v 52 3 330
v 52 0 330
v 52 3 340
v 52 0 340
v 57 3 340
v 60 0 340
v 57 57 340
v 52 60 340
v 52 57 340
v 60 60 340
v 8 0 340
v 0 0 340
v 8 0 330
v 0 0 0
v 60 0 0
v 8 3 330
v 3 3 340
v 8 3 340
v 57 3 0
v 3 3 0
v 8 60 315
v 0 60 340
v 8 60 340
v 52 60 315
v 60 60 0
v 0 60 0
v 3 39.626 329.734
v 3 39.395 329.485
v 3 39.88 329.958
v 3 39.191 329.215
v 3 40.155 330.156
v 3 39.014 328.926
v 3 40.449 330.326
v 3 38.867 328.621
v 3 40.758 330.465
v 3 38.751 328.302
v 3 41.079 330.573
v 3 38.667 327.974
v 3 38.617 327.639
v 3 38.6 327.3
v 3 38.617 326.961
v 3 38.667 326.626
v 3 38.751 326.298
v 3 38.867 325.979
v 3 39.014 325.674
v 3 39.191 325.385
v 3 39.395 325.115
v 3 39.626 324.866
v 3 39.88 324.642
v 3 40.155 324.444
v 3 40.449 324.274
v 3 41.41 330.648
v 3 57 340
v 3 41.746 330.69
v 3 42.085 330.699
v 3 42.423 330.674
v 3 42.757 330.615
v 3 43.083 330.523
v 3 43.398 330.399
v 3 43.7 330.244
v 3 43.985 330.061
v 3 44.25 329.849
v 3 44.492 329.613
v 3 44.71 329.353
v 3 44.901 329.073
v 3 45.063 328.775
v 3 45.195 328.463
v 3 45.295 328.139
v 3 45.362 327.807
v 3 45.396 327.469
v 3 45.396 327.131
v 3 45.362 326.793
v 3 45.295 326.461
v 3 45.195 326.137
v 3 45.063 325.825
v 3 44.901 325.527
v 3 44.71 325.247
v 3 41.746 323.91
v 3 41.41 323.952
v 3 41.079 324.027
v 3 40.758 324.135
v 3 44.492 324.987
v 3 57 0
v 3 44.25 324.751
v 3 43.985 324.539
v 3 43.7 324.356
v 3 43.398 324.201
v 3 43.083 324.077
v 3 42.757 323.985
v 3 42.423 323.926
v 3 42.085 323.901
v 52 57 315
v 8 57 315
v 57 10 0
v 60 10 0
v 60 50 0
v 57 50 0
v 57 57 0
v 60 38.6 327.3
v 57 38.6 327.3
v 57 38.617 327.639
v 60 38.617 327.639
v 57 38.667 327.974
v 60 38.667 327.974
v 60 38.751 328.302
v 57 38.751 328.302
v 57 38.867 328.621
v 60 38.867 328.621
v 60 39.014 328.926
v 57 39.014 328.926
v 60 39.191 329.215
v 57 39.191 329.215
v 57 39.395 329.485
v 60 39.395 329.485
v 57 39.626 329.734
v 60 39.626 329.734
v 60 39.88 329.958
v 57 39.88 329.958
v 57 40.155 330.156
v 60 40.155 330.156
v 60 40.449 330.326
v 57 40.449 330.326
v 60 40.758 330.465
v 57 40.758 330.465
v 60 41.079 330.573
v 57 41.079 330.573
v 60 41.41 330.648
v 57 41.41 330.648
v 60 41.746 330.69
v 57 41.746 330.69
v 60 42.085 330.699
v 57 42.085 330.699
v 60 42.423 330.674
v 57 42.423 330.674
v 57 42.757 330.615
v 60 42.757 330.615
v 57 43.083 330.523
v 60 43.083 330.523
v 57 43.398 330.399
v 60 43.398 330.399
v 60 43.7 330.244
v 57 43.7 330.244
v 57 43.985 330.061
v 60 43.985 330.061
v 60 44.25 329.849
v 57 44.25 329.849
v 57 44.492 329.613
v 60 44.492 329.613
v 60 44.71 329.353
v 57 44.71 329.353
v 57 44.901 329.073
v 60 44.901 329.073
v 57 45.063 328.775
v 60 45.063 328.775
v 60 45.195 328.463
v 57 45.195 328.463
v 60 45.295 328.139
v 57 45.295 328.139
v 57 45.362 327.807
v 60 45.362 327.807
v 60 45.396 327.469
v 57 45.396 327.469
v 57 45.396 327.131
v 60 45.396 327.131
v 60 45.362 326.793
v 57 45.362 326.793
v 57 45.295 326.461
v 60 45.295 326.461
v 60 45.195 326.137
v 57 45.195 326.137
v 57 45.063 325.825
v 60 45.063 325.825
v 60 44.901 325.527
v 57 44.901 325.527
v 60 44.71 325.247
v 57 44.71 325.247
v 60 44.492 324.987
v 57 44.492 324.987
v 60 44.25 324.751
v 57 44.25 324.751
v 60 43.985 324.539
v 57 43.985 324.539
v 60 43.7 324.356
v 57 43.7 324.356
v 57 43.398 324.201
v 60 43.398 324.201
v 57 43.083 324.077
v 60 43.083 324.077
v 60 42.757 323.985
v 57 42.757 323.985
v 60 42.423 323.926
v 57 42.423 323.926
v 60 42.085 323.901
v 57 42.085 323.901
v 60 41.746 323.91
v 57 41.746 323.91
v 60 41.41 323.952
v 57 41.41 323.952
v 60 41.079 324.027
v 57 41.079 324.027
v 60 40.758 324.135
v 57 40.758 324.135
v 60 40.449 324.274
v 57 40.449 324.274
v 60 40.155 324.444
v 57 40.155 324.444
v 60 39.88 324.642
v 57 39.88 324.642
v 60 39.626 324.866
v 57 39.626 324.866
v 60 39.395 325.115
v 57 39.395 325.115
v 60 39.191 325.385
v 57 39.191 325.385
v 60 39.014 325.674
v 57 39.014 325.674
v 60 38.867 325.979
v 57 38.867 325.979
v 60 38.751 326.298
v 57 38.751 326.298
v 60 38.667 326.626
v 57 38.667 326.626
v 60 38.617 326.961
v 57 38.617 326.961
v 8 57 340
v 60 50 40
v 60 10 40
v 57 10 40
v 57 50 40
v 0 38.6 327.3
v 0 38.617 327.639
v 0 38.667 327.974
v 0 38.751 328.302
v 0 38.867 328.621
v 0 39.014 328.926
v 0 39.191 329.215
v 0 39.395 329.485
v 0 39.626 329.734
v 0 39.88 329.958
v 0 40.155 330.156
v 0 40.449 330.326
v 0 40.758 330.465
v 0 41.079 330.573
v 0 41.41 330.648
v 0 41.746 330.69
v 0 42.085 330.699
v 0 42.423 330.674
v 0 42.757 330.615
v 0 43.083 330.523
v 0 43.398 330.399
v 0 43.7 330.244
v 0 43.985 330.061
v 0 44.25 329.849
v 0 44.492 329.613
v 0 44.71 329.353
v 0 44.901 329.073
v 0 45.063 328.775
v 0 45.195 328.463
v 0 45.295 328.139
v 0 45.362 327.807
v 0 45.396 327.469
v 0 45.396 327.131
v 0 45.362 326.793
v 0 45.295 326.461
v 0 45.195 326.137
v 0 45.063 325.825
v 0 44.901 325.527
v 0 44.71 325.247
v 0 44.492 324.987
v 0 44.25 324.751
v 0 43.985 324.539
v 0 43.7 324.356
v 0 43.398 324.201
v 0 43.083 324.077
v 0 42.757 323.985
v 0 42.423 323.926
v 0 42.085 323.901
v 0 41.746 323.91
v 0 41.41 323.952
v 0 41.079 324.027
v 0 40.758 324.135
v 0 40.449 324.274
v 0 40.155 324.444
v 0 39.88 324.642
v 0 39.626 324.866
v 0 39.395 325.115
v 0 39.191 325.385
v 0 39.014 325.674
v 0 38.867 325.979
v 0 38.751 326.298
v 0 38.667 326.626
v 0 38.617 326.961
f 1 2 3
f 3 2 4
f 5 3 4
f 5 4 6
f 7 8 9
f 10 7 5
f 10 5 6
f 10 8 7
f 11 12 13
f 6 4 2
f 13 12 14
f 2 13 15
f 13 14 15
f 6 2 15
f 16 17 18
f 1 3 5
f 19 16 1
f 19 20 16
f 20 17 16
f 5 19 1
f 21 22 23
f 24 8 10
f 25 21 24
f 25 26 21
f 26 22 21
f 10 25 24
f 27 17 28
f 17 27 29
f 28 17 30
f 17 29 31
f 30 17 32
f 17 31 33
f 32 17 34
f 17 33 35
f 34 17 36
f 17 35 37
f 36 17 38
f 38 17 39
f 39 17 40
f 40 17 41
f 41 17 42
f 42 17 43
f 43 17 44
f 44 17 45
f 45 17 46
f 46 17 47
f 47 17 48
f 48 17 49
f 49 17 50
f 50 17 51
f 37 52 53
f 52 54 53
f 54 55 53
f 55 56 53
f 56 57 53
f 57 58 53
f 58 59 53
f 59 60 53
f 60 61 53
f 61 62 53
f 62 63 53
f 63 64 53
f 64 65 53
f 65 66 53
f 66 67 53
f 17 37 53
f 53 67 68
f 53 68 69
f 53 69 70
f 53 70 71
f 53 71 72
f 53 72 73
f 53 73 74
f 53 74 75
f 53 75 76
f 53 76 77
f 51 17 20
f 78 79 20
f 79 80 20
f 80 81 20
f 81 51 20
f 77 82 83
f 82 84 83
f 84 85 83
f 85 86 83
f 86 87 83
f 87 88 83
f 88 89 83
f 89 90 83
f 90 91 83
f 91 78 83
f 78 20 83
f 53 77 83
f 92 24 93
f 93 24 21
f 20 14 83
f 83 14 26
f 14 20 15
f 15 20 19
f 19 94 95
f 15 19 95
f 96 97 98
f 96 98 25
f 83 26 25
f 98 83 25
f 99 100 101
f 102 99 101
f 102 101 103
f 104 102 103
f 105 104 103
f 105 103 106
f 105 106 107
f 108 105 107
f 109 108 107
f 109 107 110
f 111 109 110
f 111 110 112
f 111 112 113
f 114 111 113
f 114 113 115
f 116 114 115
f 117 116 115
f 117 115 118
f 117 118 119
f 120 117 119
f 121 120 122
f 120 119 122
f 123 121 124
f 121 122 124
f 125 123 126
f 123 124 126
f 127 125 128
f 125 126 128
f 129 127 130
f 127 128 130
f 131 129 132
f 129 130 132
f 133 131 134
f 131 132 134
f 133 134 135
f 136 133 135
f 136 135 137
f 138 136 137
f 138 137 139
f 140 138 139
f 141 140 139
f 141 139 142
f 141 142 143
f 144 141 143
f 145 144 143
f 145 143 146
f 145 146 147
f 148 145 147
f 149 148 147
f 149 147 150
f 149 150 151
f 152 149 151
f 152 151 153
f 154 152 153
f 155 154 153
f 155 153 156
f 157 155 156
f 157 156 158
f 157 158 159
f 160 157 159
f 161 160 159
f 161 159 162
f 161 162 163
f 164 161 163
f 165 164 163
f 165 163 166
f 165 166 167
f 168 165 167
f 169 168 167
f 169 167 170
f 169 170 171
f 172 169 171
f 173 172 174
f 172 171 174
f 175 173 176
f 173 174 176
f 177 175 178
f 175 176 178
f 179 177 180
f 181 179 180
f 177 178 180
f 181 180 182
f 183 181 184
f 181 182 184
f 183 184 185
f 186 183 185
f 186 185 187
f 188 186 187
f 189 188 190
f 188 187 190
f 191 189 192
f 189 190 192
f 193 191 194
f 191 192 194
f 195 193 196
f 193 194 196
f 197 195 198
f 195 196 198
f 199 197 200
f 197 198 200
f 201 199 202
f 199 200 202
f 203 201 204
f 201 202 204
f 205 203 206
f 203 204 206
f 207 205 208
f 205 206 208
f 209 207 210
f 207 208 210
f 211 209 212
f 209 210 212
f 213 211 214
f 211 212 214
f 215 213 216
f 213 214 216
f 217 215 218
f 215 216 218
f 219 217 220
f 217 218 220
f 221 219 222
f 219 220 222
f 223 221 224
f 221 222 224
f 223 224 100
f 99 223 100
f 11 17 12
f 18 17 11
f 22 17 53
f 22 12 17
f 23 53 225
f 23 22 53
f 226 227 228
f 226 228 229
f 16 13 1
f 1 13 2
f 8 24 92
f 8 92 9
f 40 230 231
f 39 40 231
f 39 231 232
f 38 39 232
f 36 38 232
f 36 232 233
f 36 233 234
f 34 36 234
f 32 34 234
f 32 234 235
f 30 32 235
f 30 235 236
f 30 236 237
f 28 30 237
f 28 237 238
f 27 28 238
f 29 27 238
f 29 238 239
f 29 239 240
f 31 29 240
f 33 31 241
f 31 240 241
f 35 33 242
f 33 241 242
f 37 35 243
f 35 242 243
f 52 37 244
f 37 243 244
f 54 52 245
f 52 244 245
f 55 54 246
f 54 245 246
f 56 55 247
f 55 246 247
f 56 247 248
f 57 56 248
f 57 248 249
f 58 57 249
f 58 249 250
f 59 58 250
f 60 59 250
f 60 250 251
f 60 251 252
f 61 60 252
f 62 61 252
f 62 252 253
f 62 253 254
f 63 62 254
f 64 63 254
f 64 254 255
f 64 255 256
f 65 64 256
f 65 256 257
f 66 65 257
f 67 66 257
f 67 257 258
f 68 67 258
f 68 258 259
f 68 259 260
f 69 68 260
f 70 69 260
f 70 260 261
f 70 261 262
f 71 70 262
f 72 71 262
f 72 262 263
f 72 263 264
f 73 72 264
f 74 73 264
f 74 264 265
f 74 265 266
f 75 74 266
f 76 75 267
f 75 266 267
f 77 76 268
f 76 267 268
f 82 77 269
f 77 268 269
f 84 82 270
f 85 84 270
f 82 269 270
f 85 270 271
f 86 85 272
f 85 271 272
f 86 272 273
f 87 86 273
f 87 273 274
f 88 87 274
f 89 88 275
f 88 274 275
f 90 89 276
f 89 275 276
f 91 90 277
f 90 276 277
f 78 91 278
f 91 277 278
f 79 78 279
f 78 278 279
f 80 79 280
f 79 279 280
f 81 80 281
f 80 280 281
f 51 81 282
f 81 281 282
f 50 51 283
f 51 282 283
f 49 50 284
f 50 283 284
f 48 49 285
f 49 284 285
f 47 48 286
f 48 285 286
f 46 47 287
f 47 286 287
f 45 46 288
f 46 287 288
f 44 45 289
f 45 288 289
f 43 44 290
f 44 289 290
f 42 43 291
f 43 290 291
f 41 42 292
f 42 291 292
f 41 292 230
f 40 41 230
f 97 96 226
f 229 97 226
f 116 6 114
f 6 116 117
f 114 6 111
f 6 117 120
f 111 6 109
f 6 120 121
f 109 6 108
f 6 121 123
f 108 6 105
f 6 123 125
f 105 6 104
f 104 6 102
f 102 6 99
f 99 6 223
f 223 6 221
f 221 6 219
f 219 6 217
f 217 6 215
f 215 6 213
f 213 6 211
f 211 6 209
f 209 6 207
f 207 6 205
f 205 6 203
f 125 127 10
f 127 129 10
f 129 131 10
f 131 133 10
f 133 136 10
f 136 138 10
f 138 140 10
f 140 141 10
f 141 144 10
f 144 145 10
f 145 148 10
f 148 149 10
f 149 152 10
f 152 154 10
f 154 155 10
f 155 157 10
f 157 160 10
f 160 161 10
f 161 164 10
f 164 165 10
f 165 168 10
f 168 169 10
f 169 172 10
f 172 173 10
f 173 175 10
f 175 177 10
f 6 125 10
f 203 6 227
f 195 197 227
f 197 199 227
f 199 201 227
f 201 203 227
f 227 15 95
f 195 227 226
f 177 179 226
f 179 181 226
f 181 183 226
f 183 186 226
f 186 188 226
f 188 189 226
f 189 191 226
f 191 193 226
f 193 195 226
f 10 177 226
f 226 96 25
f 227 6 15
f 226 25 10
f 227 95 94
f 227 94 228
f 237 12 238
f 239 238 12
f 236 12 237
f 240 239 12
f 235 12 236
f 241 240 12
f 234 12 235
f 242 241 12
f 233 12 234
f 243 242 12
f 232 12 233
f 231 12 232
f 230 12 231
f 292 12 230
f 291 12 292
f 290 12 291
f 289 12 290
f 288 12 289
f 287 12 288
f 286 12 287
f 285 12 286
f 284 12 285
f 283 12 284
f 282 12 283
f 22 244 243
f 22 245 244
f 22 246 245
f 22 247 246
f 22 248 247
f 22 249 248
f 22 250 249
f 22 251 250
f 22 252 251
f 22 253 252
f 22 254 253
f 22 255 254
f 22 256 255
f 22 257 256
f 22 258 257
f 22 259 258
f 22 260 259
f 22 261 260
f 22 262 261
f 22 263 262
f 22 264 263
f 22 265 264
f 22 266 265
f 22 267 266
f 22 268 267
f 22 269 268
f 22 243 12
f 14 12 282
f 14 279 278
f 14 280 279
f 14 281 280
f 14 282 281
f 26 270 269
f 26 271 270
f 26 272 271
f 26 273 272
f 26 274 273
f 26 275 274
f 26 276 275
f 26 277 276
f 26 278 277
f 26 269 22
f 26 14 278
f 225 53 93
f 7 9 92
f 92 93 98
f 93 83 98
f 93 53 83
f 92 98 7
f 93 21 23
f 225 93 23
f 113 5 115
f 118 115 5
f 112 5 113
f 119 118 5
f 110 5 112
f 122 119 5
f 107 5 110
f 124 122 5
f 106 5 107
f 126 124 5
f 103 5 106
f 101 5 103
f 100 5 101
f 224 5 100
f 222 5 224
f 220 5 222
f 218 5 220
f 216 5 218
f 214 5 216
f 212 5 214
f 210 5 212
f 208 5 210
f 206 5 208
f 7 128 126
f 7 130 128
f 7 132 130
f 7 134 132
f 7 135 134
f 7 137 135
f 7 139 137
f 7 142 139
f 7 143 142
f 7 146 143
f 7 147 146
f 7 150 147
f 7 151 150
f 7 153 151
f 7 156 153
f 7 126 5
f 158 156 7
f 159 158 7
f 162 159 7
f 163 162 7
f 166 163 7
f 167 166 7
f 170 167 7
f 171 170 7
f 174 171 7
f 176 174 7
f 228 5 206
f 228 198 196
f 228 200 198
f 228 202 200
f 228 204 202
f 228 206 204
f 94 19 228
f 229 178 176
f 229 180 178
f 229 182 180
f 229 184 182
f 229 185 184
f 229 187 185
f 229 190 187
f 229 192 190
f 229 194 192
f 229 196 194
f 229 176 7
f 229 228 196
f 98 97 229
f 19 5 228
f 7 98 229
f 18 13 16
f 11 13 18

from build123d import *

# Parameters (mm, degrees)
F0_W     = 60
F0_H     = 60
F0_W_2   = 54
F0_H_2   = 54
F1_DEPTH = 340
F2_W     = 40
F2_H     = 40
F3_DEPTH = 3
F4_W     = 44
F4_H     = 25
F5_DEPTH = 3
F7_D     = 6.8
F8_W     = 44
F8_H     = 10
F9_DEPTH = 25


with BuildPart() as f1:
    # F0 (on Top) → F1 (new body)
    with BuildSketch(Plane.XY):
        with Locations((30, 30)):
            Rectangle(F0_W, F0_H)
        with Locations((30, 30)):
            Rectangle(F0_W_2, F0_H_2, mode=Mode.SUBTRACT)
    extrude(amount=F1_DEPTH)

    # F2 (on face) → F3 (cut)
    with BuildSketch(Plane.YZ.offset(60)):
        with Locations((30, 20)):
            Rectangle(F2_W, F2_H)
    extrude(amount=-F3_DEPTH, mode=Mode.SUBTRACT)

    # F4 (on face) → F5 (cut)
    with BuildSketch(Plane(origin=(0, 60, 0), x_dir=(-1, 0, 0), z_dir=(0, 1, 0))):
        with Locations((-30, 327.5)):
            Rectangle(F4_W, F4_H)
    extrude(amount=-F5_DEPTH, mode=Mode.SUBTRACT)

    # F7 (through all)
    with Locations(Plane.YZ.offset(60)):
        with Locations((42, 327.3)):
            Hole(F7_D / 2)

    # F8 (on face) → F9 (cut)
    with BuildSketch(Plane.XZ):
        with Locations((30, 335)):
            Rectangle(F8_W, F8_H)
    extrude(amount=-F9_DEPTH, mode=Mode.SUBTRACT)


solid = f1.part
